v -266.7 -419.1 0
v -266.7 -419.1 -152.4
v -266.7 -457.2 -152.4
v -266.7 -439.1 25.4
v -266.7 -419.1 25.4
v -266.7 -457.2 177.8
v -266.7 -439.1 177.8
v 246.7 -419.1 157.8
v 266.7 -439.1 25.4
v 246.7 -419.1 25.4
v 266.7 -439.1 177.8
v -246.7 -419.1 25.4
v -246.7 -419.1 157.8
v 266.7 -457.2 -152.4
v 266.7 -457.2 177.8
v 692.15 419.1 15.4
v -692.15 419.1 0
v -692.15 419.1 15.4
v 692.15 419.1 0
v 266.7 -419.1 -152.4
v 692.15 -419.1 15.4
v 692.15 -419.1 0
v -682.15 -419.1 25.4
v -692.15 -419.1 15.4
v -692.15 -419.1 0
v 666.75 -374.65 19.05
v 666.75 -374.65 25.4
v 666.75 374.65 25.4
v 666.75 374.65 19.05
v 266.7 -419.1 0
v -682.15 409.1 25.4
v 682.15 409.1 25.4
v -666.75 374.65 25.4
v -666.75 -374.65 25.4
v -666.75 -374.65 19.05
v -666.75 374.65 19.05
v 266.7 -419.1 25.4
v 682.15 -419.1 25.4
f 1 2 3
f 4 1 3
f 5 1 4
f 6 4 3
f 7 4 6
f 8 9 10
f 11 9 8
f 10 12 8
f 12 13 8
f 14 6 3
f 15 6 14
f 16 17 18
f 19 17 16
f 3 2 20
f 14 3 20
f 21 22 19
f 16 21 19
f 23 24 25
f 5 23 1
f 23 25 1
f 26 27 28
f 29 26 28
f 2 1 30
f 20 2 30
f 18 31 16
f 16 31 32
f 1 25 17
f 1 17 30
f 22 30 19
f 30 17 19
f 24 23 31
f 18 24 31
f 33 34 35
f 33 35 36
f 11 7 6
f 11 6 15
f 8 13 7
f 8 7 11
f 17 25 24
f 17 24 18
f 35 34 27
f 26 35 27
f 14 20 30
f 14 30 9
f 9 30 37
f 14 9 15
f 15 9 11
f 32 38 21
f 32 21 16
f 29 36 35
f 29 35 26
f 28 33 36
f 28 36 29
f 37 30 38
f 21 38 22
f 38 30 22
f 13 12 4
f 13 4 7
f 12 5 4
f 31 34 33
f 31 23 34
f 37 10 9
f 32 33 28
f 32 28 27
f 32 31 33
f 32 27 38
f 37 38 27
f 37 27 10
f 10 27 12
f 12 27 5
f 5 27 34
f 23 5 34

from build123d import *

# Parameters (mm, degrees)
SKETCH1_W           = 1384.3
SKETCH1_H           = 838.2
BOSS_EXTRUDE1_DEPTH = 25.4
CHAMFER1_SIZE       = 10
SKETCH2_W           = 1333.5
SKETCH2_H           = 749.3
CUT_EXTRUDE1_DEPTH  = 6.35
SKETCH3_W           = 533.4
SKETCH3_H           = 330.2
BOSS_EXTRUDE2_DEPTH = 38.1
CHAMFER2_SIZE       = 20


with BuildPart() as part:
    # Sketch1 → Boss-Extrude1 (new body)
    with BuildSketch(Plane.XY):
        Rectangle(SKETCH1_W, SKETCH1_H)
    extrude(amount=BOSS_EXTRUDE1_DEPTH)

    # Chamfer1
    chamfer1_edges = [part.edges().sort_by_distance(p)[0] for p in [
        (-692.15, 0, 25.4),
        (692.15, 0, 25.4),
        (0, 419.1, 25.4),
    ]]
    chamfer(chamfer1_edges, length=CHAMFER1_SIZE)

    # Sketch2 → Cut-Extrude1 (cut)
    with BuildSketch(Plane.XY.offset(25.4)):
        Rectangle(SKETCH2_W, SKETCH2_H)
    extrude(amount=-CUT_EXTRUDE1_DEPTH, mode=Mode.SUBTRACT)

    # Sketch3 → Boss-Extrude2 (add)
    with BuildSketch(Plane.XZ.offset(419.1)):
        with Locations((0, 12.7)):
            Rectangle(SKETCH3_W, SKETCH3_H)
    extrude(amount=BOSS_EXTRUDE2_DEPTH)

    # Chamfer2
    chamfer2_edges = [part.edges().sort_by_distance(p)[0] for p in [
        (266.7, -419.1, 101.6),
        (-266.7, -419.1, 101.6),
        (0, -419.1, 177.8),
    ]]
    chamfer(chamfer2_edges, length=CHAMFER2_SIZE)


solid = part.part
